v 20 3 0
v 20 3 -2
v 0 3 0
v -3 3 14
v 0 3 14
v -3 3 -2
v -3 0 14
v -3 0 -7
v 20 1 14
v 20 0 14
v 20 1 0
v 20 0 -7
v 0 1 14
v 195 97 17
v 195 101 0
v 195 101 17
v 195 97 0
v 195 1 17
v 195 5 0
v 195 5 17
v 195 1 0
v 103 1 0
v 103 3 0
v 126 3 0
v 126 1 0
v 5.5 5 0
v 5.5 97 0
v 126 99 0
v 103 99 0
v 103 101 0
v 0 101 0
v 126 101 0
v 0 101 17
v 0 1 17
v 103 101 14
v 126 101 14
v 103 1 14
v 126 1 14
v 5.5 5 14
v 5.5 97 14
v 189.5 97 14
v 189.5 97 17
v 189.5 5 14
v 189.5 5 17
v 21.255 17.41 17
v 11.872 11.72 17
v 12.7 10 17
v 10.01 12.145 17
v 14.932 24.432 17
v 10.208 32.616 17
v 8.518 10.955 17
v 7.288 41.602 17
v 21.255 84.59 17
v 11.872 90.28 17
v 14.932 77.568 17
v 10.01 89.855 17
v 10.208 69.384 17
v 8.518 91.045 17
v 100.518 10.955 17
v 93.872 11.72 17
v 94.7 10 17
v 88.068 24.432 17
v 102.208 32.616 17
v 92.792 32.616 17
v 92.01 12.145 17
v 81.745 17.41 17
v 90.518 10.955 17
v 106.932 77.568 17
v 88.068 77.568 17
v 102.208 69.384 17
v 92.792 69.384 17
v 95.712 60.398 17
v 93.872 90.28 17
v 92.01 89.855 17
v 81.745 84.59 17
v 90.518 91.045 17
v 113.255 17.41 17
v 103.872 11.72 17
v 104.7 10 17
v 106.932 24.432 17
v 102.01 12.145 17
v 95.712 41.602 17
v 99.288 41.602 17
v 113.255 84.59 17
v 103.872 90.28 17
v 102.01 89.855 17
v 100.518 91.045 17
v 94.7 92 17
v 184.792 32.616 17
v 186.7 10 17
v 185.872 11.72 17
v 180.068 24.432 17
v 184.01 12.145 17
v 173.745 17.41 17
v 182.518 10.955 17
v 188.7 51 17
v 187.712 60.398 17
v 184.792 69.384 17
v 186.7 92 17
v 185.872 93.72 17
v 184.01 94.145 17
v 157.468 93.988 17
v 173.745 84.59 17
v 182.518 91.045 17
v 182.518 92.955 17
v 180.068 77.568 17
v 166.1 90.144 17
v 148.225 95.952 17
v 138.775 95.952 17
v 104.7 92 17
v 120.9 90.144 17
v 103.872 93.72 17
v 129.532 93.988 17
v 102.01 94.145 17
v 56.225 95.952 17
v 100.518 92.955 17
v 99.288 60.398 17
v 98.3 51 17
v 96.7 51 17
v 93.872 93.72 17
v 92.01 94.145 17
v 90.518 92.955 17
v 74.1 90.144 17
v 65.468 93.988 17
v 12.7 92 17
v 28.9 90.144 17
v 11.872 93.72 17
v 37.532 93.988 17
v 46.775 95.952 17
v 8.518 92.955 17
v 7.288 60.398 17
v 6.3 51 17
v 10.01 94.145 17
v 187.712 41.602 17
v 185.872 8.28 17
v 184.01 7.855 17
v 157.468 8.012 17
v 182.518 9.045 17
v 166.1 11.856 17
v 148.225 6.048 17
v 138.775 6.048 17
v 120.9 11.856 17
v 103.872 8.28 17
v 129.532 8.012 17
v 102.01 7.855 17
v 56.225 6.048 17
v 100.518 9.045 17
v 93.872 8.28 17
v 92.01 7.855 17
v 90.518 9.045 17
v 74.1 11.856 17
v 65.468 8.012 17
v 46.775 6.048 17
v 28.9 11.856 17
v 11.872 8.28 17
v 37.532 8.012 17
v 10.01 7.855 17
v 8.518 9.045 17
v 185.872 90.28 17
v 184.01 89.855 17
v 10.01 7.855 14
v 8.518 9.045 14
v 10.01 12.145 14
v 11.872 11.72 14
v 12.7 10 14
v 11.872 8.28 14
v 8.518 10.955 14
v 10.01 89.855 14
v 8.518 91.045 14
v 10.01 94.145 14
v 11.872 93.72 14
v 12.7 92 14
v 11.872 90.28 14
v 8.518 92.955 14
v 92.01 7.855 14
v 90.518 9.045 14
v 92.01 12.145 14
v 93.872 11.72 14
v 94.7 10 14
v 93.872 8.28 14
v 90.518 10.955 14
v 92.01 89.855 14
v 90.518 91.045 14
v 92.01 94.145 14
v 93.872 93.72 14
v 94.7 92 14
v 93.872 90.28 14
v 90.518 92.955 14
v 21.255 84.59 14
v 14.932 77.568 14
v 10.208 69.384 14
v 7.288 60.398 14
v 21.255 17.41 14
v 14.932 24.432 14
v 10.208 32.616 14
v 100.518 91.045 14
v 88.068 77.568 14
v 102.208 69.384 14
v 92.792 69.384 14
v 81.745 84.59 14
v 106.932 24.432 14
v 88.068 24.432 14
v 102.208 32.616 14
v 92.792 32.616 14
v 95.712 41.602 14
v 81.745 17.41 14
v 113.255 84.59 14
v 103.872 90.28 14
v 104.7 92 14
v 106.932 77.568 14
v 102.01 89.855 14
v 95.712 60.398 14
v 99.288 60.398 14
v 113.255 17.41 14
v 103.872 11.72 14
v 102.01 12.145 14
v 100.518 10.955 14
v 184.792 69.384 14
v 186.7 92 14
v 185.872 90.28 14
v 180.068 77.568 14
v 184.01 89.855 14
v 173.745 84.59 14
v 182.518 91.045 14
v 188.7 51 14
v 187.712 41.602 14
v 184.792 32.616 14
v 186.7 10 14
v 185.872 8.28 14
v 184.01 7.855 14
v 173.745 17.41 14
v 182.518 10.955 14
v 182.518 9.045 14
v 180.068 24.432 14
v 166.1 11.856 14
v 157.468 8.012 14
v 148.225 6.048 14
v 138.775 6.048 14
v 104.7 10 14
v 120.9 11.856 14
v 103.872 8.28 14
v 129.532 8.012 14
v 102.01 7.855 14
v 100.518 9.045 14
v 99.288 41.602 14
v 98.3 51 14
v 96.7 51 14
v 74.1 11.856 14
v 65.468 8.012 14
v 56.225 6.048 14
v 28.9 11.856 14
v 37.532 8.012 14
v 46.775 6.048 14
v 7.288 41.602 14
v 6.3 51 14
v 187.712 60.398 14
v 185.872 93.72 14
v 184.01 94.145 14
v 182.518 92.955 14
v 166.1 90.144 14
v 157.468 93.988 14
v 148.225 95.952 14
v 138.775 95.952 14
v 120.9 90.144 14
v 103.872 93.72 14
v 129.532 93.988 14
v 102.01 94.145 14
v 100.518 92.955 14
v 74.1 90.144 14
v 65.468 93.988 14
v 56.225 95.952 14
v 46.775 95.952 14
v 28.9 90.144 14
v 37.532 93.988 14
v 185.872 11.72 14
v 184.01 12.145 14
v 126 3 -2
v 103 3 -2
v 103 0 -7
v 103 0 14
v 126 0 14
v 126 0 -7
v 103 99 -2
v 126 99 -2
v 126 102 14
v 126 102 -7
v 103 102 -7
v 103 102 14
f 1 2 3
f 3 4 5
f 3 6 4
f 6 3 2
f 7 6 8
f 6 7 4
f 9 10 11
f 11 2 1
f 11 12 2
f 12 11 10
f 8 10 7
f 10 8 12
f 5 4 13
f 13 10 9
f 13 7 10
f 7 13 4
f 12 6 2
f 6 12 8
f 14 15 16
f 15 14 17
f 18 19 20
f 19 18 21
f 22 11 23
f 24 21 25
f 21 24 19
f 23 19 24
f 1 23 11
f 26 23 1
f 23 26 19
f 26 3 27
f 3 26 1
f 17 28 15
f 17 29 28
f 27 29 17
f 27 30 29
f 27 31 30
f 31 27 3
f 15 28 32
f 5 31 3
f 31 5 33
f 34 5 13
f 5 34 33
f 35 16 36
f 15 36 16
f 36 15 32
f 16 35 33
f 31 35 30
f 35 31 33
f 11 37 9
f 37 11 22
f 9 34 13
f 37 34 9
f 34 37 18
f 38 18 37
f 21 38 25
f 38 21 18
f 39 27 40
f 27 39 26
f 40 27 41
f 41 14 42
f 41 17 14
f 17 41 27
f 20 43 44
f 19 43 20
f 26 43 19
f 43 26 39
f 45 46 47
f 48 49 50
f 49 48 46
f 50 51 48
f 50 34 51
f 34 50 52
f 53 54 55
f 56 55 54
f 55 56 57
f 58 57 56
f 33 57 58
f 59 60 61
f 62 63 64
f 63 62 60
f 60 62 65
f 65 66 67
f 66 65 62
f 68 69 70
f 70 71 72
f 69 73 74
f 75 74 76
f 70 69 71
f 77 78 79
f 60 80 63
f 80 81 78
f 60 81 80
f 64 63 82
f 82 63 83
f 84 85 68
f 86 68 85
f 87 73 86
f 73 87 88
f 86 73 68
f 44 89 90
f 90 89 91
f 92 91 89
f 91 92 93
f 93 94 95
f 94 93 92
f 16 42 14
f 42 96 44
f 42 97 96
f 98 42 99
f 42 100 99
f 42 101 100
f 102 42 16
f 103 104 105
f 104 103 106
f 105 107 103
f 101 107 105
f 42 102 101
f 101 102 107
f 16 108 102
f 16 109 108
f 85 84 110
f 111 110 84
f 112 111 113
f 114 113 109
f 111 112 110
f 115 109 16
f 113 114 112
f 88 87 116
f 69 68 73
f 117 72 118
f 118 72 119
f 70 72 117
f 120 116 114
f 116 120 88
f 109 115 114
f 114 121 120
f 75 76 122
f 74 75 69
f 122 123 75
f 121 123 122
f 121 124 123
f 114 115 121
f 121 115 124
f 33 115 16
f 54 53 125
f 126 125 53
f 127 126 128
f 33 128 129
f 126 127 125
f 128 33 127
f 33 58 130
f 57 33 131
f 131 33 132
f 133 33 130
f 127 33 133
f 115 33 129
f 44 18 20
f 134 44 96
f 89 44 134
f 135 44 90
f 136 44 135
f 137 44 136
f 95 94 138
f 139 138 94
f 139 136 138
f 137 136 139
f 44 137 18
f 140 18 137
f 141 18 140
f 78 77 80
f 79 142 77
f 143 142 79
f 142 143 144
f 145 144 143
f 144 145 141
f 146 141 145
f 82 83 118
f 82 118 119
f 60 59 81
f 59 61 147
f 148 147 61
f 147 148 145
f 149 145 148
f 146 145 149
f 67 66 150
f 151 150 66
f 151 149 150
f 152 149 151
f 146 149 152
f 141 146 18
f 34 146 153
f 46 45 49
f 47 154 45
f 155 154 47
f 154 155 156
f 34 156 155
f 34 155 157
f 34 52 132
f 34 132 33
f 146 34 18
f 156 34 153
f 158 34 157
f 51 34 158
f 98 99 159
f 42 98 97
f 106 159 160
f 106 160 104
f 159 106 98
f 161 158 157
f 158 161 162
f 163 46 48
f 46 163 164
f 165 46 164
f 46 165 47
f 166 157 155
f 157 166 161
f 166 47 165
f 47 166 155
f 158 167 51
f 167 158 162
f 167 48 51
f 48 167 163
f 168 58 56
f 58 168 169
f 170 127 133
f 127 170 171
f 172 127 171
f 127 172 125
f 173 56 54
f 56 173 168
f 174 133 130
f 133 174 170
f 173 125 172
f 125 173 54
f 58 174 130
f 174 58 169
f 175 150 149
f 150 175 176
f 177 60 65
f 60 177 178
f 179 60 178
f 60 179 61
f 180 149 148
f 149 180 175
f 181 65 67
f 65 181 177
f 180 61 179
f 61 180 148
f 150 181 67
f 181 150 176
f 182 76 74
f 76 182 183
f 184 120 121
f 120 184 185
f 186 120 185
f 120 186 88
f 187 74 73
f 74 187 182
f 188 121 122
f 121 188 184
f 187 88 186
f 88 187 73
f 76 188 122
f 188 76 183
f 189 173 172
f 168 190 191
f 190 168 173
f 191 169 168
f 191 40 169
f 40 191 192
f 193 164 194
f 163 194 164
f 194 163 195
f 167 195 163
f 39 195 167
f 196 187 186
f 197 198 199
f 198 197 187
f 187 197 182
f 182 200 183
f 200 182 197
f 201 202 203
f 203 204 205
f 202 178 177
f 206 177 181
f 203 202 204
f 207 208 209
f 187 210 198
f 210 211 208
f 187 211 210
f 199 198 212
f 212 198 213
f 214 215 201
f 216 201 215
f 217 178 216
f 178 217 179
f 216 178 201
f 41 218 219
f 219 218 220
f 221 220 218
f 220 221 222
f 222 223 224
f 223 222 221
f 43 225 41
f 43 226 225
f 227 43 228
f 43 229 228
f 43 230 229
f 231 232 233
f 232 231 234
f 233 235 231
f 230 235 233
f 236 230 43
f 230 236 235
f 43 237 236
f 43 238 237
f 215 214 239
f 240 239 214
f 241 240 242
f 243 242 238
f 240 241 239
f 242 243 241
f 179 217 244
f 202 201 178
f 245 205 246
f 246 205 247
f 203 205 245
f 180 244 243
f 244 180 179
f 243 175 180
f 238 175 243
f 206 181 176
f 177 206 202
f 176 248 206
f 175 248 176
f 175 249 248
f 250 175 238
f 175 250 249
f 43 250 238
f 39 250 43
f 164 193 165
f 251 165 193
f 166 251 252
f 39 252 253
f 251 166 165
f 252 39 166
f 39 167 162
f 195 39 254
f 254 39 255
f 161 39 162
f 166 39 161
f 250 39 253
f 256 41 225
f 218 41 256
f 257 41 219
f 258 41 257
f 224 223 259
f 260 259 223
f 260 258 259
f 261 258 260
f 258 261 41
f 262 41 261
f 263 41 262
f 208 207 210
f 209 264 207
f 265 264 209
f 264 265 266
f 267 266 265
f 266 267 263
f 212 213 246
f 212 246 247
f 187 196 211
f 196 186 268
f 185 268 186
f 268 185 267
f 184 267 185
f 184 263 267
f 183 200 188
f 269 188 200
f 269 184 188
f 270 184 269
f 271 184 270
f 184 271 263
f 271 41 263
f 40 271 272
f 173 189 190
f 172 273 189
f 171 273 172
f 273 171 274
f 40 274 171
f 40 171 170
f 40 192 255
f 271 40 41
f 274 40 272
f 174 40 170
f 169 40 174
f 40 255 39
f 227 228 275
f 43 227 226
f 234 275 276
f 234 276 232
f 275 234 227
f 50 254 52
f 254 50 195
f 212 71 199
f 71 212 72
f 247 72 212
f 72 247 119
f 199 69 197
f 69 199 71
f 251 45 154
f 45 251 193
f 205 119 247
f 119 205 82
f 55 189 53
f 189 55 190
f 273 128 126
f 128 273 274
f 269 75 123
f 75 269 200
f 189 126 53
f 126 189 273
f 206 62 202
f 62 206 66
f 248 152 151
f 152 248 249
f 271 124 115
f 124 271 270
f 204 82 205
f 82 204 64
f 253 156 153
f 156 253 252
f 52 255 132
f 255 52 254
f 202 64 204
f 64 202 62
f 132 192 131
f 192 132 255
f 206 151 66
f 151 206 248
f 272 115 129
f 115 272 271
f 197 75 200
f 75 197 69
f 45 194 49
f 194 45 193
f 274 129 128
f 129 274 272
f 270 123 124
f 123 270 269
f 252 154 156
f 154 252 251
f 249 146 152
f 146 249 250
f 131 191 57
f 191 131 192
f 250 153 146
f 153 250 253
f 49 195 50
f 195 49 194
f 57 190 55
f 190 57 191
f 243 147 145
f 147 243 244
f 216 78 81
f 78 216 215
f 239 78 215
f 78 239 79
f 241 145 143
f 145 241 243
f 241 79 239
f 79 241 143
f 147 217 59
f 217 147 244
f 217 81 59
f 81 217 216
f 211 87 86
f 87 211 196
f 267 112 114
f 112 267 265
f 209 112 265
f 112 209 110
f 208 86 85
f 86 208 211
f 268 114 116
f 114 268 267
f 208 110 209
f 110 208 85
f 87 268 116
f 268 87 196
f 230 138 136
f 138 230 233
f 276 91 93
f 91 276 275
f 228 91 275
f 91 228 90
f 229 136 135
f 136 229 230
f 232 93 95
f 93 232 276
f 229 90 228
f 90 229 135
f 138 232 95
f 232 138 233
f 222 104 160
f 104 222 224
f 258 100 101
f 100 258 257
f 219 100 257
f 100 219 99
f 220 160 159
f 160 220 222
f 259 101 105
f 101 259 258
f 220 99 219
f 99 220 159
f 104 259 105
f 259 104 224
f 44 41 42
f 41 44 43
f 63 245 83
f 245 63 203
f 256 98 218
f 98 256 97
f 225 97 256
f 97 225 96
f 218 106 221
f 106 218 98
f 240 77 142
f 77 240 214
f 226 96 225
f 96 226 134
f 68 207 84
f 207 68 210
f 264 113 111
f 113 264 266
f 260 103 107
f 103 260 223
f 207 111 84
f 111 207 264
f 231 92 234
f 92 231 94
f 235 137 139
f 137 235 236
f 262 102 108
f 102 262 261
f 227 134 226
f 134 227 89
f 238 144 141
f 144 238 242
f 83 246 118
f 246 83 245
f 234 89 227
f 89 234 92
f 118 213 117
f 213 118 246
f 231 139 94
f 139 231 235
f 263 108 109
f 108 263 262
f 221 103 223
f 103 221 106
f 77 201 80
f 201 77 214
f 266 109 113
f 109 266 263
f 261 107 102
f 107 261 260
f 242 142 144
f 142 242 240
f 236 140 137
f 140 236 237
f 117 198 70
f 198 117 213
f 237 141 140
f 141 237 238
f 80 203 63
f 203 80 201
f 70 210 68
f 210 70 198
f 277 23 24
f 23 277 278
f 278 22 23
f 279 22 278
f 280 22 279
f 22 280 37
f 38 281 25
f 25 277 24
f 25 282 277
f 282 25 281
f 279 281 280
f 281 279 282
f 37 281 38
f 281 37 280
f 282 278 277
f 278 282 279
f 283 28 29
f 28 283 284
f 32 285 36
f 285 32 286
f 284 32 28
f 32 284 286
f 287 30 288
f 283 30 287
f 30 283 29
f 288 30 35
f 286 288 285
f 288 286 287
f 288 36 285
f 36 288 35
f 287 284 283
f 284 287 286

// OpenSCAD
// file: fan_edges.scad
// Height / width in mm
fan_size=92;

module fan_edges(radius=44, screw_hole_radius=2.2, hole_offset=5) {
    difference() {
        cube([fan_size, fan_size, 3]);
        
        // Center large cylinder in the middle
        translate([fan_size/2, fan_size/2, -1])
            cylinder(h=10, r=radius, center=true);
        
        // Small cylinders at each corner
        for (x = [hole_offset, fan_size-hole_offset], y = [hole_offset, fan_size-hole_offset]) {
            translate([x, y, -1])
                cylinder(h=10, r=screw_hole_radius);
        }
    }
}

module repeated_fan_edges(radius=44, n_fans=2, screw_hole_radius=2) {
    for (i = [0:n_fans-1]) {
        translate([i * fan_size, 0, 0])
            fan_edges(radius=radius, screw_hole_radius=screw_hole_radius);
    }
}

module frame(radius=44, n_fans=2, screw_hole_radius=2.2) {
    length = 100 * n_fans - 5;

    difference() {
        cube([length, 100, 14]);
        translate([(length - n_fans*fan_size) / 2, (100 - fan_size) / 2, -1])
            cube([3*fan_size, fan_size, 16]);
    }
    
    difference() {
        translate([0, 0, 14])
        cube([length, 100, 3]);
        translate([(length - n_fans*fan_size) / 2, (100 - fan_size) / 2, -1])
            cube([3*fan_size, fan_size, 20]);
    }
    translate([(length - n_fans*fan_size) / 2, (100 - fan_size) / 2, 14])
      repeated_fan_edges(radius=radius, n_fans=n_fans, screw_hole_radius=screw_hole_radius);
    
}
// file: mounted_hook.scad
module hook(arm_length=1, arm_thickness=16, hook_length=5, hook_thickness=3, hook_width=23, gap_size=3) {
    // Arm
    translate([0, -arm_thickness, 0])
    cube([arm_length, arm_thickness, hook_width]);

    // Small block
    translate([0, -16, 0])
    cube([hook_thickness, 16-gap_size, hook_width]);

    // Hook
    translate([0, 0, 0])
    linear_extrude(height = hook_width)
    polygon([[0, hook_length], [0, 0], [hook_thickness, 0]]);
}

// Wrapper module that applies transformations
module mounted_hook(gap_size=3) {
    translate([20, 0, -2])
    rotate([90, 180, 270])
    hook(gap_size);
}

// Call the new module
mounted_hook();
// main file
include <mounted_hook.scad>
include <fan_edges.scad>

module shroud(radius=45.2, n_fans=3) {    
    translate([0, 1, 0])
    frame(radius=radius, n_fans=n_fans);
    translate([106,0,0])
    mounted_hook();

    translate([106,0,0])
    rotate([0, 0, 180])
    translate([-17, -2-100, 0])
    mounted_hook();
}

shroud(n_fans=2);
